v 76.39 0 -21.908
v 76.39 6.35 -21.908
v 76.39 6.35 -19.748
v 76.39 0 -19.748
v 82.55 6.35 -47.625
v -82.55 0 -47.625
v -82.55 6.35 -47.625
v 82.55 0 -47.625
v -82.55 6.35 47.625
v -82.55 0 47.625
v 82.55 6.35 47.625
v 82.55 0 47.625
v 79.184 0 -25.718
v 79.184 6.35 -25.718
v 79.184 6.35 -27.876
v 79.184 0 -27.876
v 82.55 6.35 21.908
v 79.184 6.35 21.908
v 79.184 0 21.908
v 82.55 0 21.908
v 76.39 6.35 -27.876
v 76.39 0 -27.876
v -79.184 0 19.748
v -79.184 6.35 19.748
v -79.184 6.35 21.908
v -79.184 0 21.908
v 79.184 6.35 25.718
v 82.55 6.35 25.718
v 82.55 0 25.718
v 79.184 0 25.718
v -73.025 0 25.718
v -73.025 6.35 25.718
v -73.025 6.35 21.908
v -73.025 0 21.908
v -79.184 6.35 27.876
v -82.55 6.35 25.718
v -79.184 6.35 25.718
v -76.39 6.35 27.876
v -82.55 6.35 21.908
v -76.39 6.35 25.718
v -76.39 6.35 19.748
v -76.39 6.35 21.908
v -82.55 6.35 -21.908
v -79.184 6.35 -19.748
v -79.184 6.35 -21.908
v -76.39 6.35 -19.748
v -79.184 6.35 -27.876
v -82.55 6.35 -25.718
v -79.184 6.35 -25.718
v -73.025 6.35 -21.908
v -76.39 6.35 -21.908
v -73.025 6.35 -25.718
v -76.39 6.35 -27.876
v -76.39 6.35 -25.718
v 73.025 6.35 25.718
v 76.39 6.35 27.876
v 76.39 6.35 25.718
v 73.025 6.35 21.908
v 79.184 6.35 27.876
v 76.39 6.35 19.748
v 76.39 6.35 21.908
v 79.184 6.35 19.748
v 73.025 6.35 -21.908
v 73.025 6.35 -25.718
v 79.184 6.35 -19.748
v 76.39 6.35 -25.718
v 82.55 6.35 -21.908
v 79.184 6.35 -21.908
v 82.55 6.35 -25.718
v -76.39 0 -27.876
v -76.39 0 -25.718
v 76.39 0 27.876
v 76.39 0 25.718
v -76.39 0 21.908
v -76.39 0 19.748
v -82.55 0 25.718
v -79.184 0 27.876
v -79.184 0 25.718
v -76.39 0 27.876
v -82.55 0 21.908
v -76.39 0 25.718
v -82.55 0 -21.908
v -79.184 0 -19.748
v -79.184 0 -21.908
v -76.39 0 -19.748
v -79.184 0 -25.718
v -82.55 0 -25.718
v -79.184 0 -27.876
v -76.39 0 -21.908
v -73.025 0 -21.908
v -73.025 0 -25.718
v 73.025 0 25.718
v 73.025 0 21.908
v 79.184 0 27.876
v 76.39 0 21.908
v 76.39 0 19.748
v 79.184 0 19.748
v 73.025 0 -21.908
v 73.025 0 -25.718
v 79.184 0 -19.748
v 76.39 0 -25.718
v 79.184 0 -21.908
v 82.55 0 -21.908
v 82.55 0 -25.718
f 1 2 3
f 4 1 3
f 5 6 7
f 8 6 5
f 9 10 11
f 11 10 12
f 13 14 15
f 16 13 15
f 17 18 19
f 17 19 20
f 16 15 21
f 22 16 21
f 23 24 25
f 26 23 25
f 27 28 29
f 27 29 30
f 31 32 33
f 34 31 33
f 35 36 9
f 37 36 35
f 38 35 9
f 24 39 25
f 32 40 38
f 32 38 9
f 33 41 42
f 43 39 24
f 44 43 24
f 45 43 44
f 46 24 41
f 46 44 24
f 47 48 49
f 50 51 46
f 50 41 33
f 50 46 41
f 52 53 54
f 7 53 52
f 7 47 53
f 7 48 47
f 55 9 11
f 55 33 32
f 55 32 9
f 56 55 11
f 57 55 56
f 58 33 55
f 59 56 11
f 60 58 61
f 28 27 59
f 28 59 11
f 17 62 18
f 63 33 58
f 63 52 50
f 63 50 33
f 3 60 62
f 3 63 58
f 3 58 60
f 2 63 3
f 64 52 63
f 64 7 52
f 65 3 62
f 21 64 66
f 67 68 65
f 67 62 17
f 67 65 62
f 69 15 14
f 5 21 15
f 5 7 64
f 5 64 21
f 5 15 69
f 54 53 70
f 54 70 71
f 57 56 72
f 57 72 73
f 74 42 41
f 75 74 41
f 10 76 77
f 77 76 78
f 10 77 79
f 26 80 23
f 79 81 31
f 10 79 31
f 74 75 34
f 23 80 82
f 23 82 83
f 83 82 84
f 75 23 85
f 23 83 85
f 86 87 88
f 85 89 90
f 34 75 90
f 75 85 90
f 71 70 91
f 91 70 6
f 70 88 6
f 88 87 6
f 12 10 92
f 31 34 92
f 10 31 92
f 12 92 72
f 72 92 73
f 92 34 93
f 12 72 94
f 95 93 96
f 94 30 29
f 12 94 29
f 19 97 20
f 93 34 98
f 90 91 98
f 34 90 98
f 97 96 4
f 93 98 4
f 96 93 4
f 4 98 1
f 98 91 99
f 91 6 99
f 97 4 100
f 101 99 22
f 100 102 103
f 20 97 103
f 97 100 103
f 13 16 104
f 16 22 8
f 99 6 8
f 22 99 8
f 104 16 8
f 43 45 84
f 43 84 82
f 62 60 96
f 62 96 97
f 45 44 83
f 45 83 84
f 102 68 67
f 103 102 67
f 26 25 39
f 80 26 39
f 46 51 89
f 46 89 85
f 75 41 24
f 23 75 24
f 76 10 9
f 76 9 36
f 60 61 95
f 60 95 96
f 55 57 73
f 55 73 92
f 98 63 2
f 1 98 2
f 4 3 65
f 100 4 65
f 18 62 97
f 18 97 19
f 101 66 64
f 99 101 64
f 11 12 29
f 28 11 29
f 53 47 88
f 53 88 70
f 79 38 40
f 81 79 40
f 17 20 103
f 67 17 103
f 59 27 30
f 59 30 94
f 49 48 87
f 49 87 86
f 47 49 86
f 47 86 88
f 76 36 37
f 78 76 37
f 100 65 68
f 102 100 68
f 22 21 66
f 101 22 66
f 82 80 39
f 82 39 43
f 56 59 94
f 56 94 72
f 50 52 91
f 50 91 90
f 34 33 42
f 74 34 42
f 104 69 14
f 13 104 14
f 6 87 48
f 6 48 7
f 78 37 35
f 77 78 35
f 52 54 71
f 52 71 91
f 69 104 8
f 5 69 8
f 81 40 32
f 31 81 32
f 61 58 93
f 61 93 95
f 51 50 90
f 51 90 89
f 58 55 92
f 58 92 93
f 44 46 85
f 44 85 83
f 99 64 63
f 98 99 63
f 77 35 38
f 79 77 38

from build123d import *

# Parameters (mm, degrees)
SKETCH1_W            = 165.1
SKETCH1_H            = 95.25
BOSS_EXTRUDE1_DEPTH  = 6.35
CUT_EXTRUDE1_DEPTH   = 96.514216874
MIRROR2_COPY_1_DEPTH = 96.514216874


with BuildPart() as part:
    # Sketch1 → Boss-Extrude1 (new body)
    with BuildSketch(Plane(origin=(0, 0, 0), x_dir=(1, 0, 0), z_dir=(0, 1, 0))):
        Rectangle(SKETCH1_W, SKETCH1_H)
    extrude(amount=BOSS_EXTRUDE1_DEPTH)

    # Sketch2 → Cut-Extrude1 (cut, through all)
    with BuildSketch(Plane(origin=(0, 6.35, 0), x_dir=(1, 0, 0), z_dir=(0, 1, 0))):
        Polygon((82.55, -21.9075), (82.55, -25.7175), (79.1845, -25.7175), (79.1845, -27.8765), (76.3905, -27.8765), (76.3905, -25.7175), (73.025, -25.7175), (73.025, -21.9075), (76.3905, -21.9075), (76.3905, -19.7485), (79.1845, -19.7485), (79.1845, -21.9075), align=None)
    cut_extrude1 = extrude(amount=-CUT_EXTRUDE1_DEPTH, mode=Mode.SUBTRACT)

    # Mirror1: Cut-Extrude1 across plane
    add(cut_extrude1.mirror(Plane.XY), mode=Mode.SUBTRACT)

    # Mirror2: Cut-Extrude1 across plane
    add(cut_extrude1.mirror(Plane(origin=(0, 0, 0), x_dir=(0, 0, 1), z_dir=(1, 0, 0))), mode=Mode.SUBTRACT)

    # Mirror2 copy 1 sketch → Mirror2 copy 1 (cut, through all)
    with BuildSketch(Plane(origin=(0, 6.35, 0), x_dir=(-1, 0, 0), z_dir=(0, 1, 0))):
        Polygon((82.55, -21.9075), (82.55, -25.7175), (79.1845, -25.7175), (79.1845, -27.8765), (76.3905, -27.8765), (76.3905, -25.7175), (73.025, -25.7175), (73.025, -21.9075), (76.3905, -21.9075), (76.3905, -19.7485), (79.1845, -19.7485), (79.1845, -21.9075), align=None)
    extrude(amount=-MIRROR2_COPY_1_DEPTH, mode=Mode.SUBTRACT)


solid = part.part
